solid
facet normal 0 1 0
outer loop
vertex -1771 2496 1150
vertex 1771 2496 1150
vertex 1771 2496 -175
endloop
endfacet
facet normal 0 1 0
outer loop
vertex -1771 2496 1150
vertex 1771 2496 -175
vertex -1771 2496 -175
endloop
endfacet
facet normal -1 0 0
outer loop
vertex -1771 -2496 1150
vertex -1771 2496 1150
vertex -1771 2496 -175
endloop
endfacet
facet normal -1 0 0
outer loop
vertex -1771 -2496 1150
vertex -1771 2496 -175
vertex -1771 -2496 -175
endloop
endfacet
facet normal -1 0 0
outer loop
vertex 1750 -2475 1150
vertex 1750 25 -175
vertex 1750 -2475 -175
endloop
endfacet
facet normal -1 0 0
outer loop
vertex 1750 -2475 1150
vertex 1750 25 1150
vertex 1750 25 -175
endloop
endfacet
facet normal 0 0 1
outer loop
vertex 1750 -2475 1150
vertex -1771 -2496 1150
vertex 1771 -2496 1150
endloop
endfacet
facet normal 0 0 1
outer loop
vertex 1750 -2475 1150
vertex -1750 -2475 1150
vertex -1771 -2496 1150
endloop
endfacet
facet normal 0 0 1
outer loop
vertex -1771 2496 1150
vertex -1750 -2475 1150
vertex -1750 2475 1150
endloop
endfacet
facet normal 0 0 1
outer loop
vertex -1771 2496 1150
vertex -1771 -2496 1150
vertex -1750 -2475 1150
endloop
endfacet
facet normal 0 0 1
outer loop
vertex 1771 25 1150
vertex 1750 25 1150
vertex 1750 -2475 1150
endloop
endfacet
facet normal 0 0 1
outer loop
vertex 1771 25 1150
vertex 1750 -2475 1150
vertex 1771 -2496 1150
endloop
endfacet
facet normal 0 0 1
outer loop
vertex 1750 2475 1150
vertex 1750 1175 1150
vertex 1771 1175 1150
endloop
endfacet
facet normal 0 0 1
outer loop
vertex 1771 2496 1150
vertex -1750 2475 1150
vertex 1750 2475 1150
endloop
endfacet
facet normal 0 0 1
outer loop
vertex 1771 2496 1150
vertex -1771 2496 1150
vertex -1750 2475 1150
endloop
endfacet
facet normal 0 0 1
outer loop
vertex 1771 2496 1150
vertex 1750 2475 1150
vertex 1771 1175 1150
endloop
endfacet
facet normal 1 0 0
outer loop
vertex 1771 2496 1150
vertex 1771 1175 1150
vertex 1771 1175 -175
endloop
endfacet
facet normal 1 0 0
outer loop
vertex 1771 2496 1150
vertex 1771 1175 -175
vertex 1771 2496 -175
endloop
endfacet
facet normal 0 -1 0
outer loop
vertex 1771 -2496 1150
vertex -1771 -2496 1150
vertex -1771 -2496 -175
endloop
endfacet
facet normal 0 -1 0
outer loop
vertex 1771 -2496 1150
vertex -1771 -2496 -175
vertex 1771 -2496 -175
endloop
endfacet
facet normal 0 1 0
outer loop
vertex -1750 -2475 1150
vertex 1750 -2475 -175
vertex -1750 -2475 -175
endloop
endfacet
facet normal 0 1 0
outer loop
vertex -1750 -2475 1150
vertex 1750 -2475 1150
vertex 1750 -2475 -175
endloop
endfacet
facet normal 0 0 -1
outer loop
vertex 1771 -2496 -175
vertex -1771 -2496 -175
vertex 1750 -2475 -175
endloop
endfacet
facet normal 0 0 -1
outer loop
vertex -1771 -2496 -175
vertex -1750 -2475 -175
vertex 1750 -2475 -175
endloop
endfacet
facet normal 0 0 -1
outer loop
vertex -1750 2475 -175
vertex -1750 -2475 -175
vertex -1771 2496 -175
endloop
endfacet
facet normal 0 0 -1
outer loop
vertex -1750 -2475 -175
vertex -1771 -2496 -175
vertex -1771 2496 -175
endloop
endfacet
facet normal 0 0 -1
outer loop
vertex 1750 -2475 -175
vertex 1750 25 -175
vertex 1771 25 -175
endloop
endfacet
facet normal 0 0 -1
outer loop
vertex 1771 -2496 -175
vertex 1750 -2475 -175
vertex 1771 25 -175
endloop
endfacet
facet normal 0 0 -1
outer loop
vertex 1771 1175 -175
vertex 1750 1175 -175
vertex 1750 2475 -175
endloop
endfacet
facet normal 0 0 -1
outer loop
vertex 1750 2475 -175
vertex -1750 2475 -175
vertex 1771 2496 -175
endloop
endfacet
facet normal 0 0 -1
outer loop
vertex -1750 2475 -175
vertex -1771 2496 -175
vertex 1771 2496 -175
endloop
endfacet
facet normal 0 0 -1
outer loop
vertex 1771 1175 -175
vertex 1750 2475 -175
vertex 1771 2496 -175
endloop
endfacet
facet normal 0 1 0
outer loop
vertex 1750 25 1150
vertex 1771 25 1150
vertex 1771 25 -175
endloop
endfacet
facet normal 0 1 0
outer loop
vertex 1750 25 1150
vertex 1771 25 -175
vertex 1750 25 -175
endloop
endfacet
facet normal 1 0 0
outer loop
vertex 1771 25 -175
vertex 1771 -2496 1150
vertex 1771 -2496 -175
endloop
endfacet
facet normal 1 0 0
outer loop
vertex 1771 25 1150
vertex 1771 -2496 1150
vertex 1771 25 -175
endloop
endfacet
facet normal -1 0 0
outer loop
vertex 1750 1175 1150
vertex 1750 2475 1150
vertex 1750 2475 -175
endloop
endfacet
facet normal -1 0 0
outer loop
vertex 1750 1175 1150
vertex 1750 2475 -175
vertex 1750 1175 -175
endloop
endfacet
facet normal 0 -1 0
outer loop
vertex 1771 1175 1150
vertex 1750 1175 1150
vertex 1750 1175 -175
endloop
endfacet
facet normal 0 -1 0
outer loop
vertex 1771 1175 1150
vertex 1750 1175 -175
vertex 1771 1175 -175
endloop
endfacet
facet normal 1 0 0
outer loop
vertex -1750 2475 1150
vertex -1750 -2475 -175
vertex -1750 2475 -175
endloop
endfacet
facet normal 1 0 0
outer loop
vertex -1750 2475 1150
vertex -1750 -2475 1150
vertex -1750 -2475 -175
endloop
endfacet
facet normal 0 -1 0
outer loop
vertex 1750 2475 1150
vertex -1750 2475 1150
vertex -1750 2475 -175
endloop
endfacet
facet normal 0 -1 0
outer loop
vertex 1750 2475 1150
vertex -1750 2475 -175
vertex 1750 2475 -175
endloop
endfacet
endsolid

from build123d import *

# Parameters (mm, degrees)
F1_DEPTH      = 1150
F1_DEPTH_BACK = 175


with BuildPart() as f1:
    # F0 (on Top) → F1 (new body, two sides)
    with BuildSketch(Plane.XY) as f1_sk:
        Polygon((-1750, -2475), (-1750, 2475), (1750, 2475), (1750, 1175), (1771, 1175), (1771, 2496), (-1771, 2496), (-1771, -2496), (1771, -2496), (1771, 25), (1750, 25), (1750, -2475), align=None)
    extrude(amount=F1_DEPTH)
    extrude(f1_sk.sketch, amount=-F1_DEPTH_BACK)


solid = f1.part
